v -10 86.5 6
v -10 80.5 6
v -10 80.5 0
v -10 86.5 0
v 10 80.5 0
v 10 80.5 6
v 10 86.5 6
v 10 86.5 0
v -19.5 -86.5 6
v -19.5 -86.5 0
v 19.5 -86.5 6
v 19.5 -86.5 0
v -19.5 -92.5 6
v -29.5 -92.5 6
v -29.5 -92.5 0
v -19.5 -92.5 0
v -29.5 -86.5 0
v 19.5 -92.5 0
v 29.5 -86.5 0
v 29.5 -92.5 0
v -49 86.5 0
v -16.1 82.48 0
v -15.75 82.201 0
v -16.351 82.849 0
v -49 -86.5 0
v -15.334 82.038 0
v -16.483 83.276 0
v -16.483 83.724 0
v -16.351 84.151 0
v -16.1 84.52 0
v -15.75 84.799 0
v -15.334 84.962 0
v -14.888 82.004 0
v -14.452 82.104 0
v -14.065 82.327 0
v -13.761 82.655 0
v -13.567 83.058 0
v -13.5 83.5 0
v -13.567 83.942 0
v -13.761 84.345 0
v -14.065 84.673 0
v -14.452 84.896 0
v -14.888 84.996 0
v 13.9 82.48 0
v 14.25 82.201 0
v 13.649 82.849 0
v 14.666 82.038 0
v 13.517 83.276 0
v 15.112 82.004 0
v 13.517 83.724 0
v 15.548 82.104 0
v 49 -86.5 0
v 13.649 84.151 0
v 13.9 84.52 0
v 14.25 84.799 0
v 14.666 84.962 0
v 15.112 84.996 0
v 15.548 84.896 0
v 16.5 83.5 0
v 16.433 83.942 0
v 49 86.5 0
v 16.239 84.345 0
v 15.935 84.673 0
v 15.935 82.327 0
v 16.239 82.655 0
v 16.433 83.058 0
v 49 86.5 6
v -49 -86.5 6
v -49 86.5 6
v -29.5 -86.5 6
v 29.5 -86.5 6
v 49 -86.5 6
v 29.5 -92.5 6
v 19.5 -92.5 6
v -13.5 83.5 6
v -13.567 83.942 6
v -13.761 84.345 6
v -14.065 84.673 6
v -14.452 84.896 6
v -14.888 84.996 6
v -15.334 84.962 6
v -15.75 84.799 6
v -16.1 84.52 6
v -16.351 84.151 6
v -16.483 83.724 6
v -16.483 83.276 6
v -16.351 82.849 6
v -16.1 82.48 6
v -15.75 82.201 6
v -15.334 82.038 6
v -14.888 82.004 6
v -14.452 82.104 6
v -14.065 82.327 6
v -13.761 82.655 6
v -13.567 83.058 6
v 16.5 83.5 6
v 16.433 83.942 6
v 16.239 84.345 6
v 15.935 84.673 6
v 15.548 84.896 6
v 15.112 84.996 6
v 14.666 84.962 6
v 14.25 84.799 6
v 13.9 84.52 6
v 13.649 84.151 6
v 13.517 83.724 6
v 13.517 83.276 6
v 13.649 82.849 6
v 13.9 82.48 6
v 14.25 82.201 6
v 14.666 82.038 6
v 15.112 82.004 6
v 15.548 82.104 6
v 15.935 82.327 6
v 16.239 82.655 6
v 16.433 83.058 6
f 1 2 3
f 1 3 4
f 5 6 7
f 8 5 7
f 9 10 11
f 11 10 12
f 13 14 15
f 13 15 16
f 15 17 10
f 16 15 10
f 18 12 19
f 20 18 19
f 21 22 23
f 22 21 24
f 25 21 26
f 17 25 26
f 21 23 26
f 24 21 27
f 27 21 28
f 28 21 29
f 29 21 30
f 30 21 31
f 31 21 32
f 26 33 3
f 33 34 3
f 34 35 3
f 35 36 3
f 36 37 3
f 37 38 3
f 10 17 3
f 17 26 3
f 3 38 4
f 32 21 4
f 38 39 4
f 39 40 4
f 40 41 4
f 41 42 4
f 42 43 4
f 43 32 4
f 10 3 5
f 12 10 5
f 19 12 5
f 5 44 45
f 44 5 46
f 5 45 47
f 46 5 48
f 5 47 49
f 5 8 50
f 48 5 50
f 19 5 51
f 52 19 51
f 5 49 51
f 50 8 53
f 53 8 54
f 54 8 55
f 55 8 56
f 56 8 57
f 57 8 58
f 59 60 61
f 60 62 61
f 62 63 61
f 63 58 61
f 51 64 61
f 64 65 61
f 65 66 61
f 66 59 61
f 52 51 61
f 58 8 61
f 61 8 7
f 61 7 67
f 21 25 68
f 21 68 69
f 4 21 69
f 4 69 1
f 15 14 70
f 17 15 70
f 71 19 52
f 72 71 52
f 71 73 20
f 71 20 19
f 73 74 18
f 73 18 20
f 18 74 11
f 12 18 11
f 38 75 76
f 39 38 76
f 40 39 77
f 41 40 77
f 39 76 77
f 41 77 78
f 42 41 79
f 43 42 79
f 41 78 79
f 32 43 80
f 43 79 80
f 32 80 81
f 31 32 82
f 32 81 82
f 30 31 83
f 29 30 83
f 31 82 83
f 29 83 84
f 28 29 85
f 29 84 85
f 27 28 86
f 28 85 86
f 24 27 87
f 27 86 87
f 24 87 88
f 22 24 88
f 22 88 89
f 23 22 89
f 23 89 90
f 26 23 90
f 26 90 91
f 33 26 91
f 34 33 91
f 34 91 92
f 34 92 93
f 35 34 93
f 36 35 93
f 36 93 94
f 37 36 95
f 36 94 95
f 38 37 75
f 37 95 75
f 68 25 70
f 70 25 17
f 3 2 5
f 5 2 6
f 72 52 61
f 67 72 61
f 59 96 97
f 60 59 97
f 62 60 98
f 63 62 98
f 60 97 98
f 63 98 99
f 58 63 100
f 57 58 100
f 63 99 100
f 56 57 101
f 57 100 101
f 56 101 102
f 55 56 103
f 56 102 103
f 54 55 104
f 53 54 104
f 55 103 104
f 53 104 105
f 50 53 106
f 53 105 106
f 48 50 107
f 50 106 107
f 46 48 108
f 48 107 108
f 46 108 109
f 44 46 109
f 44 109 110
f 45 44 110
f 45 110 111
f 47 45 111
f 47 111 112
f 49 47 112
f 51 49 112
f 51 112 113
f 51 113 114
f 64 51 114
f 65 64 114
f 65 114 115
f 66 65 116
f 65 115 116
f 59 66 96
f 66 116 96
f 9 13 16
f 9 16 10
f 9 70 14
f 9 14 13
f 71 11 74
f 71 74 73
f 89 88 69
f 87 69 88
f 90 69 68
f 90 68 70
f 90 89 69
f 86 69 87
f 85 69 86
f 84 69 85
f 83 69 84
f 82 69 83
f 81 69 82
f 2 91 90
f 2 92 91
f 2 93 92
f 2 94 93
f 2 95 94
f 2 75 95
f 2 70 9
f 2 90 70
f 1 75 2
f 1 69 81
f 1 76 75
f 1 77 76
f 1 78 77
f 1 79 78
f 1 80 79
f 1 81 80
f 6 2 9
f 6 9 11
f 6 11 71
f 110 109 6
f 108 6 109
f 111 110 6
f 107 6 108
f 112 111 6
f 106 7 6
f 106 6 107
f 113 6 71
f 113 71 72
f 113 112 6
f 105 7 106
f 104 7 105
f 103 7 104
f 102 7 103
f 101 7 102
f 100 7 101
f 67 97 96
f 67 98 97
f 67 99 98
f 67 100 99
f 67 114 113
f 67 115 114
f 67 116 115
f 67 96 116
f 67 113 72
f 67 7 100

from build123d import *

# Parameters (mm, degrees)
ESQUISSE1_W             = 98
ESQUISSE1_H             = 173
BOSS_EXTRU_1_DEPTH      = 6
ESQUISSE2_W             = 10
ESQUISSE2_H             = 6
BOSS_EXTRU_2_DEPTH      = 6
ESQUISSE3_R             = 1.5
ENL_V_MAT_EXTRU_1_DEPTH = 6
ESQUISSE4_W             = 20
ESQUISSE4_H             = 6
ENL_V_MAT_EXTRU_2_DEPTH = 6


with BuildPart() as part:
    # Esquisse1 → Boss.-Extru.1 (new body)
    with BuildSketch(Plane.XY):
        Rectangle(ESQUISSE1_W, ESQUISSE1_H)
    extrude(amount=BOSS_EXTRU_1_DEPTH)

    # Esquisse2 → Boss.-Extru.2 (add)
    with BuildSketch(Plane.XY.offset(6)):
        with Locations((24.5, -89.5)):
            Rectangle(ESQUISSE2_W, ESQUISSE2_H)
        with Locations((-24.5, -89.5)):
            Rectangle(ESQUISSE2_W, ESQUISSE2_H)
    extrude(amount=-BOSS_EXTRU_2_DEPTH)

    # Esquisse3 → Enlèv. mat.-Extru.1 (cut)
    with BuildSketch(Plane.XY.offset(6)):
        with Locations((-15, 83.5)):
            Circle(ESQUISSE3_R)
        with Locations((15, 83.5)):
            Circle(ESQUISSE3_R)
    extrude(amount=-ENL_V_MAT_EXTRU_1_DEPTH, mode=Mode.SUBTRACT)

    # Esquisse4 → Enlèv. mat.-Extru.2 (cut)
    with BuildSketch(Plane.XY.offset(6)):
        with Locations((0, 83.5)):
            Rectangle(ESQUISSE4_W, ESQUISSE4_H)
    extrude(amount=-ENL_V_MAT_EXTRU_2_DEPTH, mode=Mode.SUBTRACT)


solid = part.part
